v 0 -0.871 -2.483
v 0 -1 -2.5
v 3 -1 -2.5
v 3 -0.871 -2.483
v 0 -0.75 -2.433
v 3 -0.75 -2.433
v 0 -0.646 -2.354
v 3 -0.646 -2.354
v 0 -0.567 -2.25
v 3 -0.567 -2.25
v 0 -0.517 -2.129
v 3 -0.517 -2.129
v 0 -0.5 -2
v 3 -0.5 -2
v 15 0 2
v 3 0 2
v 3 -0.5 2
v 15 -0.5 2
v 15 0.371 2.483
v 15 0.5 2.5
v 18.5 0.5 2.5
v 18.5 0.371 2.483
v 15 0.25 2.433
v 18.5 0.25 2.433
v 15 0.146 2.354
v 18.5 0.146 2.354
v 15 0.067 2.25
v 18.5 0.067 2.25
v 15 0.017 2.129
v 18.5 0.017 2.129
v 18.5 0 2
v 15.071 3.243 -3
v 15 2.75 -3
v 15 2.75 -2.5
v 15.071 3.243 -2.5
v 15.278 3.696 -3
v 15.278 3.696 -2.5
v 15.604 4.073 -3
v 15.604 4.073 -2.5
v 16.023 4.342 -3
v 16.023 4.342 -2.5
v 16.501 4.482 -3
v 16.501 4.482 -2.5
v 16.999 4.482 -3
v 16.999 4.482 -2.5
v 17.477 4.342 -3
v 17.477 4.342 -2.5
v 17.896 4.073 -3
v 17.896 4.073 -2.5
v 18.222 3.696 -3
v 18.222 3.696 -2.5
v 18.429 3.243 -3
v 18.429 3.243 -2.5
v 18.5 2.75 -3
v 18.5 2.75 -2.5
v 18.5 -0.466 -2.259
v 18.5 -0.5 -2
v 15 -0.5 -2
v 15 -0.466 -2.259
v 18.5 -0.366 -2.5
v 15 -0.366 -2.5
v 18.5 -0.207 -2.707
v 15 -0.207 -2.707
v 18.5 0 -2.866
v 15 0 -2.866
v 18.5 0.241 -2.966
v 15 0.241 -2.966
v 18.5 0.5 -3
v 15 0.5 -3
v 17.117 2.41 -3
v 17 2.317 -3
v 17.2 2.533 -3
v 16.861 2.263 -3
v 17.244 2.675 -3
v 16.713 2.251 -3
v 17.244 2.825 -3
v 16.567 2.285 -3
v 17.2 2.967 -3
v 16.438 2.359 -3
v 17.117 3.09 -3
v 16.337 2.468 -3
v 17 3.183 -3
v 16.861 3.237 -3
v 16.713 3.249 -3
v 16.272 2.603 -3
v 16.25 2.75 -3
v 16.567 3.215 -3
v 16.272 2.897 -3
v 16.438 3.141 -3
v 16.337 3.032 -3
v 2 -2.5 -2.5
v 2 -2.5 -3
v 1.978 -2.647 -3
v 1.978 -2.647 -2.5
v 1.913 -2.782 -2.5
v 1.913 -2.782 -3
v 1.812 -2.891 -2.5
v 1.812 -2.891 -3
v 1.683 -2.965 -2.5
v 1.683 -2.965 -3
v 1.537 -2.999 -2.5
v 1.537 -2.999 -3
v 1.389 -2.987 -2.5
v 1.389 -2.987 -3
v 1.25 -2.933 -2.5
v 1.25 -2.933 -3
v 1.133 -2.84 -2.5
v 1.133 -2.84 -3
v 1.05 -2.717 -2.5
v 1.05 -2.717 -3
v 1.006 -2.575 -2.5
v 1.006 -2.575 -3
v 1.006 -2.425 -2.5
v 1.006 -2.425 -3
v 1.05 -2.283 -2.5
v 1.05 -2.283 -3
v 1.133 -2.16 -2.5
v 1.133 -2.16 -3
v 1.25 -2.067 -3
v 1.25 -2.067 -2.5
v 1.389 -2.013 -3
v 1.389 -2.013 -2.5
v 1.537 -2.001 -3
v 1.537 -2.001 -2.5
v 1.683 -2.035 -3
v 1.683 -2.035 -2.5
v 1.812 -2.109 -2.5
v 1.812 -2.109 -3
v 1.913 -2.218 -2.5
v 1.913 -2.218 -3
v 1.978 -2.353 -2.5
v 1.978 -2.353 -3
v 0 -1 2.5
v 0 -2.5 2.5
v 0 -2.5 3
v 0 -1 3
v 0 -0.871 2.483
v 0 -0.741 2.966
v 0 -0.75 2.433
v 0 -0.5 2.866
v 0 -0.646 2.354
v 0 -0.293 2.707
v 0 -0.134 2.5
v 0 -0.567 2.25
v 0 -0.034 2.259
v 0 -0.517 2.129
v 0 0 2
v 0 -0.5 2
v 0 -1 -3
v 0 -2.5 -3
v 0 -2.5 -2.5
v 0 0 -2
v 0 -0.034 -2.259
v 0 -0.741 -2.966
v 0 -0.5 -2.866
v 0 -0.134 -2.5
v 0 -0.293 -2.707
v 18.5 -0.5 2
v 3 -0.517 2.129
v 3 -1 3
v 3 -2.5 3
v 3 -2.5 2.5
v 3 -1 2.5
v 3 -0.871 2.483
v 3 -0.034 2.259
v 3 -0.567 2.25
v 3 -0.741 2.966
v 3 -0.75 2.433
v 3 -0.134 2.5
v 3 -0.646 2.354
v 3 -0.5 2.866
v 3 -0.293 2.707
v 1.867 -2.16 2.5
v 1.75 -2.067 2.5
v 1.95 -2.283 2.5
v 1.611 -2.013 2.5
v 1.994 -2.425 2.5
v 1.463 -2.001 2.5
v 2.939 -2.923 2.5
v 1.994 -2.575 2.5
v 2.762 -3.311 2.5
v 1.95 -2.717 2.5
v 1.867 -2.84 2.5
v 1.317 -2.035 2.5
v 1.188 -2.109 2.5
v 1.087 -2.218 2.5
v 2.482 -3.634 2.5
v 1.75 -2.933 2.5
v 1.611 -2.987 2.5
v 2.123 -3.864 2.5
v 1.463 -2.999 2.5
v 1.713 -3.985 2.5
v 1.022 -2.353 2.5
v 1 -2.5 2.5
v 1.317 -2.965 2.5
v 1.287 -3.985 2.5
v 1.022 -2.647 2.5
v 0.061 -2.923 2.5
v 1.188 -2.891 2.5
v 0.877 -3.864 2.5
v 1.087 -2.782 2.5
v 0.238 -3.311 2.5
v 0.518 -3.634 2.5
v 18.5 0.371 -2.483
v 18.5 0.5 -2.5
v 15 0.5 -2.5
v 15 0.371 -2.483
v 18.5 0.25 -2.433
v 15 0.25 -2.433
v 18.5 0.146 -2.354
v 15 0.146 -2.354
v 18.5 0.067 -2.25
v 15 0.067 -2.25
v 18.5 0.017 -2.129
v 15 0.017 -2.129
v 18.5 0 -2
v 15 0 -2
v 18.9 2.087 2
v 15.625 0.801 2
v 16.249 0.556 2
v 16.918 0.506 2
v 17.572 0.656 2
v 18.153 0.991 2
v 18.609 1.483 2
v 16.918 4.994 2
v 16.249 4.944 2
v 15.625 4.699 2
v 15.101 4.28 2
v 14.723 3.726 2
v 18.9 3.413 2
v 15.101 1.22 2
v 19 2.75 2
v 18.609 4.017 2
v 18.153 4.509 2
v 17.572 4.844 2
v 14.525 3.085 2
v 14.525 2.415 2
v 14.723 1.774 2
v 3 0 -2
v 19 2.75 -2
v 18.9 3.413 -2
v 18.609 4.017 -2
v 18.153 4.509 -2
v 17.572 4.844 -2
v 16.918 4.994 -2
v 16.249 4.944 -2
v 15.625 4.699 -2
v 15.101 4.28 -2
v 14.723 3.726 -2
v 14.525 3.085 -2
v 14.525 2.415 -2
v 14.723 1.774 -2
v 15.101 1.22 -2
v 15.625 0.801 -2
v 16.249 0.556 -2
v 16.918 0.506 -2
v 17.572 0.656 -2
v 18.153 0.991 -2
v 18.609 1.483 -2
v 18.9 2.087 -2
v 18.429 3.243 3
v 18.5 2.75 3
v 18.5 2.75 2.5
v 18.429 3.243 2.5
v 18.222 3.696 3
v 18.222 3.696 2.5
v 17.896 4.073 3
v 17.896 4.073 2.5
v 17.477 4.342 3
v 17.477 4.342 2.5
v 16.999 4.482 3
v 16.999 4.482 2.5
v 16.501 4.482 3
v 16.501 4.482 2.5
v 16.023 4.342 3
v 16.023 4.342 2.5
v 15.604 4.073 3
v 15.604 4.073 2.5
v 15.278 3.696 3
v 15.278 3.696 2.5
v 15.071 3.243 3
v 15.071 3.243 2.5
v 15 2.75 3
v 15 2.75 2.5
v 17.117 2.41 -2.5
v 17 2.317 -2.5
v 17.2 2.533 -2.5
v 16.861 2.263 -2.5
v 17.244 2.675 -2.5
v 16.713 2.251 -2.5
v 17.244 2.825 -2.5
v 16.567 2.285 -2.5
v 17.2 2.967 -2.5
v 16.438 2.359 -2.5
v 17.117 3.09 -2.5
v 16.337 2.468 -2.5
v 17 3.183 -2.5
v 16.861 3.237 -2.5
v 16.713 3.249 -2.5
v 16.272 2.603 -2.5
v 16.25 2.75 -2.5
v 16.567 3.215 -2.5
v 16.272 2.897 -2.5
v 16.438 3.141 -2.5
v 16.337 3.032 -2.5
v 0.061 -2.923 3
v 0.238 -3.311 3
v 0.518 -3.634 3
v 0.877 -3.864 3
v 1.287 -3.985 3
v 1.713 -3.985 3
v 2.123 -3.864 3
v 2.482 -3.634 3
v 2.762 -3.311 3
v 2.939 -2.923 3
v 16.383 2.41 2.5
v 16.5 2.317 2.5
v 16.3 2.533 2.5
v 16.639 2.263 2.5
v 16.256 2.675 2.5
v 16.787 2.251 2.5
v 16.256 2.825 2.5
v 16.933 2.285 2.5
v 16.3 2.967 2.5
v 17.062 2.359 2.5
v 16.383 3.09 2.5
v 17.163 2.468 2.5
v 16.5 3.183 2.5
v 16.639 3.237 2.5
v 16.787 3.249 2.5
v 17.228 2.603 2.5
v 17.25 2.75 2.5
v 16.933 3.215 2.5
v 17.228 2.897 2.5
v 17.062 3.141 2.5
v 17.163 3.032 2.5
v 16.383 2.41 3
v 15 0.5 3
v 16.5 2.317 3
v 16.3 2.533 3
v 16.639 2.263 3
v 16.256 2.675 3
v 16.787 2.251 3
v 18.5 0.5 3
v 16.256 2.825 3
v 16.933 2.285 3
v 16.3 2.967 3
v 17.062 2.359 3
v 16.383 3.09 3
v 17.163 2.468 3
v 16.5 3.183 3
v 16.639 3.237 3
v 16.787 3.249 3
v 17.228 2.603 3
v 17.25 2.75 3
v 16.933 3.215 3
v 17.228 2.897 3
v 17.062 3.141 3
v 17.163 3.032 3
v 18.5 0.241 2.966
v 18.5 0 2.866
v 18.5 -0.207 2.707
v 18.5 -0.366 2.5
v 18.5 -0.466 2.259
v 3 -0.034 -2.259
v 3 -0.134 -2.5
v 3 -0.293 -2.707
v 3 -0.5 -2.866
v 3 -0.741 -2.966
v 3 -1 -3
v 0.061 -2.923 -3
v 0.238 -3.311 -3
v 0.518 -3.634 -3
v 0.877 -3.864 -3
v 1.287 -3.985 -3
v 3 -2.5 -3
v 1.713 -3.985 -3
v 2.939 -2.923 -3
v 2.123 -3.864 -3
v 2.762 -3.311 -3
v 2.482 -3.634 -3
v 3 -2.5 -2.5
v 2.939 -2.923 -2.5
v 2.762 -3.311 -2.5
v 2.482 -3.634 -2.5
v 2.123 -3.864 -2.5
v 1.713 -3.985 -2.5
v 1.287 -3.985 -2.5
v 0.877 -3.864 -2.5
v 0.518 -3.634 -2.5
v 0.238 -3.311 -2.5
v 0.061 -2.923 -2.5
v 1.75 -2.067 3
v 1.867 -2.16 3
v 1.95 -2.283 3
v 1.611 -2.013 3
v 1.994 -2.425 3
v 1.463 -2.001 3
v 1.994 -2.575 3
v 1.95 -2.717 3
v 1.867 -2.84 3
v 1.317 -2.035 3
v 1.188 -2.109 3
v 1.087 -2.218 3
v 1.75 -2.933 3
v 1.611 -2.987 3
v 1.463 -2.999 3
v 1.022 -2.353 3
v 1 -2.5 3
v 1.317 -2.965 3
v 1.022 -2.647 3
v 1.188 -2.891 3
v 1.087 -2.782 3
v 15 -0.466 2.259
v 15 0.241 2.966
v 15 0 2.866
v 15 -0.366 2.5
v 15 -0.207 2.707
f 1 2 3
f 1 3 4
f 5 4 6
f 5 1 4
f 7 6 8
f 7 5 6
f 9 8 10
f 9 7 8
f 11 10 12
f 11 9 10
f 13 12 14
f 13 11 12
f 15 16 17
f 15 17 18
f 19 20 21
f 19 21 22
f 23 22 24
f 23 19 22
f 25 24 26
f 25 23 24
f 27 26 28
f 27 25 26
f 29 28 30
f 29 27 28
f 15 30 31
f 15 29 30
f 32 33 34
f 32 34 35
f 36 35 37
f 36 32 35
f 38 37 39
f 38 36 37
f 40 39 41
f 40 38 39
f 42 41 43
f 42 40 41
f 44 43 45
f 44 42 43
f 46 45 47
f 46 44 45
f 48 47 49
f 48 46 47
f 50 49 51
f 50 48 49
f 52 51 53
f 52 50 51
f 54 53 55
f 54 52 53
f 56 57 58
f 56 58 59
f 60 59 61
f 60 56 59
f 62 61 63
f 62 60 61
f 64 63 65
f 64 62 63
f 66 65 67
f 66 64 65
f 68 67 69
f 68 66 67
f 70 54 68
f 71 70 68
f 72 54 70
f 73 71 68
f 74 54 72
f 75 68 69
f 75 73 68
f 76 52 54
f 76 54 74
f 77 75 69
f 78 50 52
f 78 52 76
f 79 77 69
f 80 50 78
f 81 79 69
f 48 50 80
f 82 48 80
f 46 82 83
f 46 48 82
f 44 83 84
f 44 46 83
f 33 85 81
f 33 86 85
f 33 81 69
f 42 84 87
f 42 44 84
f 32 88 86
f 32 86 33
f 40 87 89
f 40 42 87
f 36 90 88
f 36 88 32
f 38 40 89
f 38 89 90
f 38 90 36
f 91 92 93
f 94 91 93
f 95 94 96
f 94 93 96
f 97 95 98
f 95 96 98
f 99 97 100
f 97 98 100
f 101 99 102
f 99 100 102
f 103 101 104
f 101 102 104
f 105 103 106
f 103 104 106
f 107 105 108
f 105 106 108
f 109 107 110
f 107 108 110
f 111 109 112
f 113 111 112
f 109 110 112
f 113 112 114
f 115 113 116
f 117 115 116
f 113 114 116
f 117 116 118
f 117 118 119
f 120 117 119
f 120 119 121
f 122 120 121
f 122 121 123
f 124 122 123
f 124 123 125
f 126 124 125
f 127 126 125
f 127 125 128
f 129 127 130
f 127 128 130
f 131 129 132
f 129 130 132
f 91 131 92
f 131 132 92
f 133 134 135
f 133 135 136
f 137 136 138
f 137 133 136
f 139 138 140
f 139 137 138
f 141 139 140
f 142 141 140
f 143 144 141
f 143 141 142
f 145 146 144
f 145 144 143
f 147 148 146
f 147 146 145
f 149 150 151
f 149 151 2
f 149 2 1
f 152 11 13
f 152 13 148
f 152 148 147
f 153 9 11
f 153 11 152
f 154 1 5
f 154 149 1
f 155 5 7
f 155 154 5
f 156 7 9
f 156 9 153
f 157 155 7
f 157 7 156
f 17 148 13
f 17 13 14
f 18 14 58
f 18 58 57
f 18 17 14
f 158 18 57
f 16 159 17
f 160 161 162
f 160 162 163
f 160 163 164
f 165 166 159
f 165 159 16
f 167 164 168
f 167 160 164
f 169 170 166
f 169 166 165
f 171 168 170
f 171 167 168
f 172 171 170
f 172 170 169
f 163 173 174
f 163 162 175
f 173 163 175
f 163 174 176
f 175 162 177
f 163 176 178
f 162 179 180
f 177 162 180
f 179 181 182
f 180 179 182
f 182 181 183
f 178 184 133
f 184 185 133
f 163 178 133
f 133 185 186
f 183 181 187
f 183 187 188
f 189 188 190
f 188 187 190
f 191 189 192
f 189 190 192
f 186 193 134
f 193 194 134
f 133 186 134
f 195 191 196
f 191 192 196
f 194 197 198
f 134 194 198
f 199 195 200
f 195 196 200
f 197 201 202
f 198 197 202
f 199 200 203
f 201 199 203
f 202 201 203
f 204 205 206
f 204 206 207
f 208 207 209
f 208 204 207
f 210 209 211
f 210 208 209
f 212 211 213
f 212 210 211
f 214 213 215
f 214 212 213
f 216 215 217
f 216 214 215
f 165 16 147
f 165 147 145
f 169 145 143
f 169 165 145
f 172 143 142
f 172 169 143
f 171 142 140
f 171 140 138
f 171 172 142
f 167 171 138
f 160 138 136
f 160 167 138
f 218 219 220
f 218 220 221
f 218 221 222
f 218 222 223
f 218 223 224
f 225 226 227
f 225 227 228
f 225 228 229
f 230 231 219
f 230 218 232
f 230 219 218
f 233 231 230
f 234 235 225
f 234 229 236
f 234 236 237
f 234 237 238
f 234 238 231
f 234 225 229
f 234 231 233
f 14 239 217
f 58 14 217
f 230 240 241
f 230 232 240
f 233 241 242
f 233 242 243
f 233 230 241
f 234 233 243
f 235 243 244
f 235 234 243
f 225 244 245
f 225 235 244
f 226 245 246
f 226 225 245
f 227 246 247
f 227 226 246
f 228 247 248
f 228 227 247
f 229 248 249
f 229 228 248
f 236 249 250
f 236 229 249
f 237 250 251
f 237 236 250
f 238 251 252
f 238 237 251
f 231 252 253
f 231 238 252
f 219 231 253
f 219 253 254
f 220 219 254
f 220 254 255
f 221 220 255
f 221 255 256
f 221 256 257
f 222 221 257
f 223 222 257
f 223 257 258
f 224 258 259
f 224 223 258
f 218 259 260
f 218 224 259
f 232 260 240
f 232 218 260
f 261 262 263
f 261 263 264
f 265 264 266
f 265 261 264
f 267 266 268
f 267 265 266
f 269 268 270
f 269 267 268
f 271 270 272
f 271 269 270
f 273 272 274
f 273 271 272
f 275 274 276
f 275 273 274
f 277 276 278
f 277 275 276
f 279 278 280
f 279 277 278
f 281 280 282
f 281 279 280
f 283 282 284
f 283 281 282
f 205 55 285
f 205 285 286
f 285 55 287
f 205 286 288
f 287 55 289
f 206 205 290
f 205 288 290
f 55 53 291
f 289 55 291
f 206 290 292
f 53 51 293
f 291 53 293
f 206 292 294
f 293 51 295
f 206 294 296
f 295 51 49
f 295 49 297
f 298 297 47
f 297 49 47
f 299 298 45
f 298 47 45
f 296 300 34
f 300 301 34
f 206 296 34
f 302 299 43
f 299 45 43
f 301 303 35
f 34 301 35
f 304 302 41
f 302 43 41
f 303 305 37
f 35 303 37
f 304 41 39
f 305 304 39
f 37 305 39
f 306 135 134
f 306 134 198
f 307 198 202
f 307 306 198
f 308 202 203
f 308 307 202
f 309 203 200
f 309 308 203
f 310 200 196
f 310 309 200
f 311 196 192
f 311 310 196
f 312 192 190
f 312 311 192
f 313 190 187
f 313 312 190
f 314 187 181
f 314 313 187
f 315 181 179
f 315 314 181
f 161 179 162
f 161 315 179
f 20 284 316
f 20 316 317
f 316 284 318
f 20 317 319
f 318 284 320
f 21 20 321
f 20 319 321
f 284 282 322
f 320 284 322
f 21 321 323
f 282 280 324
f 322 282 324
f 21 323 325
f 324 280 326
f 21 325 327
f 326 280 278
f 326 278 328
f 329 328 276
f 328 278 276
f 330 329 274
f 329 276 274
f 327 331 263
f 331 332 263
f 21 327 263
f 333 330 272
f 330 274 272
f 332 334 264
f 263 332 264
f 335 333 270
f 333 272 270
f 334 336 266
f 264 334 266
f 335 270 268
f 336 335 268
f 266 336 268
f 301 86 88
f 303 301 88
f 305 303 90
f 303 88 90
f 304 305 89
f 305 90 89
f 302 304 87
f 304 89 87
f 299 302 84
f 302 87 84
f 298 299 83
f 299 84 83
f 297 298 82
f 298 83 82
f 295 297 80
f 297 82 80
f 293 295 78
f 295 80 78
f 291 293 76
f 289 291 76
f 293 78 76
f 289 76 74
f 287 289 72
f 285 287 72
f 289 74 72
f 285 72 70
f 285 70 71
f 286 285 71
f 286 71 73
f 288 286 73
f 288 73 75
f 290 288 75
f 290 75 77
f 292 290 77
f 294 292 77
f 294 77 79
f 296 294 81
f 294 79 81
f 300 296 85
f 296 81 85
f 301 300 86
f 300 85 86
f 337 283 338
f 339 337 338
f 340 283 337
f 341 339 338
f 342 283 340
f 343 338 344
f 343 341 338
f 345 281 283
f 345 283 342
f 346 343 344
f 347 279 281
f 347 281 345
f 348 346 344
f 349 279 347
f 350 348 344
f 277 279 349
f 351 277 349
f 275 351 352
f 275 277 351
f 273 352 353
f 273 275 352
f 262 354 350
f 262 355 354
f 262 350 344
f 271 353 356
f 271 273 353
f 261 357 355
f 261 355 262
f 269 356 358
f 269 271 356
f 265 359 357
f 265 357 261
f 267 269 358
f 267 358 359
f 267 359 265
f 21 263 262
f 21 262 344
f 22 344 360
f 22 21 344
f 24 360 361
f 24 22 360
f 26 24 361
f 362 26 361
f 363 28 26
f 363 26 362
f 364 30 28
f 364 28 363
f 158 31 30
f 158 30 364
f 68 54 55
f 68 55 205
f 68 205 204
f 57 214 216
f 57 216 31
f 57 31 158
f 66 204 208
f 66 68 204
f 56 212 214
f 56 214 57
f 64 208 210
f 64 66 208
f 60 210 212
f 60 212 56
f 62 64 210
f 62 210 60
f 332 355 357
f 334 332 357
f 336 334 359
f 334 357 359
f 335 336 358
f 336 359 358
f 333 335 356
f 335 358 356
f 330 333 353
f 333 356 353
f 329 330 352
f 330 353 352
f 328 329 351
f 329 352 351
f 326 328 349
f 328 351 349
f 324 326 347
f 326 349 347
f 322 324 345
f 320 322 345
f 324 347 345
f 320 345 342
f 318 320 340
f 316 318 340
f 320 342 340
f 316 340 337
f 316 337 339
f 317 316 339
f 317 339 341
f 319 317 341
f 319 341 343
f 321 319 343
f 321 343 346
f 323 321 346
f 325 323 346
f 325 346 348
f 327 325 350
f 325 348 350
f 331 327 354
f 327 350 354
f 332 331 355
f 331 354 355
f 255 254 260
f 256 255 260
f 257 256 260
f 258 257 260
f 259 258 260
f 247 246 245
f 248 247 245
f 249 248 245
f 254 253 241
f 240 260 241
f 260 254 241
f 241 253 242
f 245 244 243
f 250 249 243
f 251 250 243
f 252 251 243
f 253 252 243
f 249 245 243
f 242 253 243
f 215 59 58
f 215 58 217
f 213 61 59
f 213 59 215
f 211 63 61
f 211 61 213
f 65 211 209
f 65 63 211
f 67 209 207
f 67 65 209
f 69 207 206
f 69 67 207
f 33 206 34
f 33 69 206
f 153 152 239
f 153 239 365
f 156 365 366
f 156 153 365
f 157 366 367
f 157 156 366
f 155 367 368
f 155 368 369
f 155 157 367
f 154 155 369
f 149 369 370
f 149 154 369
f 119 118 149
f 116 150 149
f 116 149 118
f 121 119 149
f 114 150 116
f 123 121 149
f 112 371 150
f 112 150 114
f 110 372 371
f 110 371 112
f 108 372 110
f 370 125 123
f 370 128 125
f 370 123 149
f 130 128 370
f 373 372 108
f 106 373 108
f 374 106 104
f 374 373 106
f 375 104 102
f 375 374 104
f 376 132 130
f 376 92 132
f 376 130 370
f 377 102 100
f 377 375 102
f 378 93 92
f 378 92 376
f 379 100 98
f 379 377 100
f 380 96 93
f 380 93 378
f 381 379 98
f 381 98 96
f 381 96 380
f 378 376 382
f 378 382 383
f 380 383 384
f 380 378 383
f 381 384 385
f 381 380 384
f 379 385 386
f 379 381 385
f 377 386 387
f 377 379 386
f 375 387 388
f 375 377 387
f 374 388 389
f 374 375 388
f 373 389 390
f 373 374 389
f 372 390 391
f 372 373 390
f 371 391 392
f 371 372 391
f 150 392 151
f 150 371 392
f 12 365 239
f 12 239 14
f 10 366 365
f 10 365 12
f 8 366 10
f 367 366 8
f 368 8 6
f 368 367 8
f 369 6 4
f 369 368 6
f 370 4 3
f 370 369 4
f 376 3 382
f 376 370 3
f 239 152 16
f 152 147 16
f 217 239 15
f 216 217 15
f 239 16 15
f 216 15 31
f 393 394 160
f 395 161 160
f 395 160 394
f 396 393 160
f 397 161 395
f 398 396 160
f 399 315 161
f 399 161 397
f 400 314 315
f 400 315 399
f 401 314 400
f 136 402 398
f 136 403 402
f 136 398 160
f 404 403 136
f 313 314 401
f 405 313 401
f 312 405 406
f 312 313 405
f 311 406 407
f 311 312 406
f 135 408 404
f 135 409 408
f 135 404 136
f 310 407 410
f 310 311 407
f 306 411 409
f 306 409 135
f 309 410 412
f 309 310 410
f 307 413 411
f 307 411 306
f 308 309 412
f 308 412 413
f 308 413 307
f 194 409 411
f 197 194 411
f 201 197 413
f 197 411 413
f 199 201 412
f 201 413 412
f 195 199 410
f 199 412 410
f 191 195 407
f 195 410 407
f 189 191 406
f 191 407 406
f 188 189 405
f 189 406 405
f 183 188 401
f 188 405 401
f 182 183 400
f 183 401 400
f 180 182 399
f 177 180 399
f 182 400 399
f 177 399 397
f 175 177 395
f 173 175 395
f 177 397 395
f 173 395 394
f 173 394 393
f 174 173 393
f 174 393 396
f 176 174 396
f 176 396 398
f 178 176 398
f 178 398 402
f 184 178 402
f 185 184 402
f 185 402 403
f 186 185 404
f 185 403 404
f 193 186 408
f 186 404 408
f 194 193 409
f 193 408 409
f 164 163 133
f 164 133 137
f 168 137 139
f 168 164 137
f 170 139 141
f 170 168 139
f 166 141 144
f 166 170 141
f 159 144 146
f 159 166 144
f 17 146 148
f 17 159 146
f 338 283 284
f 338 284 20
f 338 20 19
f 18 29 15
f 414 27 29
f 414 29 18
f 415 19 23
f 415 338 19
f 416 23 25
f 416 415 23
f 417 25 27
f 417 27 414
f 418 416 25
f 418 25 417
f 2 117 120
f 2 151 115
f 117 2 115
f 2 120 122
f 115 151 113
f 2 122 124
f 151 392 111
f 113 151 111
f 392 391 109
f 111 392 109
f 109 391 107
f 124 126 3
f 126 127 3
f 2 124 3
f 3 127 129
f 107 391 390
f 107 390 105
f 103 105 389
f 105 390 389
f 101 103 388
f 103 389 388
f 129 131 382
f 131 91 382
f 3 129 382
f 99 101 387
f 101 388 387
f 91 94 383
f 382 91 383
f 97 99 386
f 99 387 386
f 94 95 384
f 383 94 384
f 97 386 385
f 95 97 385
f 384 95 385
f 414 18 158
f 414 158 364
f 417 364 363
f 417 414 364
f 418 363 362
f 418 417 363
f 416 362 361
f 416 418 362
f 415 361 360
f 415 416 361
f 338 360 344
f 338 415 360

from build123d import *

# Parameters (mm, degrees)
ESQUISSE1_W                        = 18.5
ESQUISSE1_H                        = 0.5
T_LE_DE_BASE_PLI_E1_DEPTH          = 2
T_LE_PLI_E_SUR_AR_TE1_DEPTH        = 3.5
T_LE_START                         = 0.5
T_LE_PLI_E_SUR_AR_TE1_PROFILE_R    = 0.5
T_LE_PLI_E_SUR_AR_TE1_FLAT_DEPTH   = 0.5
T_LE_PLI_E_SUR_AR_TE1_BEND_DEPTH   = 3.5
T_LE_PLI_E_SUR_AR_TE1_PROFILE_2_R  = 0.5
T_LE_PLI_E_SUR_AR_TE1_FLAT_2_DEPTH = 0.5
ESQUISSE12_R                       = 2.25
BOSS_EXTRU_1_DEPTH                 = 2
T_LE_PLI_E_SUR_AR_TE2_DEPTH        = 3
T_LE_PLI_E_SUR_AR_TE2_PROFILE_R    = 0.5
T_LE_PLI_E_SUR_AR_TE2_FLAT_DEPTH   = 0.5
T_LE_PLI_E_SUR_AR_TE2_BEND_DEPTH   = 3
T_LE_PLI_E_SUR_AR_TE2_PROFILE_2_R  = 0.5
T_LE_PLI_E_SUR_AR_TE2_FLAT_2_DEPTH = 0.5


# Sheet-metal steps are written as plain solids
with BuildPart() as part:
    # Esquisse1 → Tôle de base pliée1 (new, symmetric)
    with BuildSketch(Plane.XY):
        with Locations((9.25, -0.25)):
            Rectangle(ESQUISSE1_W, ESQUISSE1_H)
    extrude(amount=T_LE_DE_BASE_PLI_E1_DEPTH, both=True)

    # Tôle pliée sur arête1 bend section (across the edge) → Tôle pliée sur arête1 (add)
    with BuildSketch(Plane(origin=(15, 0, 2.5), x_dir=(0, 0, -1), z_dir=(1, 0, 0))):
        with BuildLine():
            Line((-0.5, 0.5), (0, 0.5))
            ThreePointArc((0, 0.5), (0.146446609, 0.146446609), (0.5, 0))
            Line((0.5, 0), (0.5, -0.5))
            ThreePointArc((0.5, -0.5), (-0.207106781, -0.207106781), (-0.5, 0.5))
        make_face()
    extrude(amount=T_LE_PLI_E_SUR_AR_TE1_DEPTH)

    # Tôle pliée sur arête1 profile (on flange) → Tôle pliée sur arête1 flat (add)
    with BuildSketch(Plane.XY.offset(2.5).offset(T_LE_START)):
        with BuildLine():
            Line((15, 0.5), (18.5, 0.5))
            Line((18.5, 0.5), (18.5, 2.75))
            ThreePointArc((18.5, 2.75), (16.75, 4.5), (15, 2.75))
            Line((15, 2.75), (15, 0.5))
        make_face()
        with Locations((16.75, 2.75)):
            Circle(T_LE_PLI_E_SUR_AR_TE1_PROFILE_R, mode=Mode.SUBTRACT)
    extrude(amount=-T_LE_PLI_E_SUR_AR_TE1_FLAT_DEPTH)

    # Tôle pliée sur arête1 bend section 2 (across the edge) → Tôle pliée sur arête1 bend (add)
    with BuildSketch(Plane(origin=(18.5, 0, -2.5), x_dir=(0, 0, 1), z_dir=(-1, 0, 0))):
        with BuildLine():
            Line((-0.5, 0.5), (0, 0.5))
            ThreePointArc((0, 0.5), (0.146446609, 0.146446609), (0.5, 0))
            Line((0.5, 0), (0.5, -0.5))
            ThreePointArc((0.5, -0.5), (-0.207106781, -0.207106781), (-0.5, 0.5))
        make_face()
    extrude(amount=T_LE_PLI_E_SUR_AR_TE1_BEND_DEPTH)

    # Tôle pliée sur arête1 profile 2 (on flange) → Tôle pliée sur arête1 flat 2 (add)
    with BuildSketch(Plane(origin=(0, 0, -2.5), x_dir=(-1, 0, 0), z_dir=(0, 0, -1)).offset(T_LE_START)):
        with BuildLine():
            Line((-18.5, 2.75), (-18.5, 0.5))
            Line((-18.5, 0.5), (-15, 0.5))
            Line((-15, 0.5), (-15, 2.75))
            ThreePointArc((-15, 2.75), (-16.75, 4.5), (-18.5, 2.75))
        make_face()
        with Locations((-16.75, 2.75)):
            Circle(T_LE_PLI_E_SUR_AR_TE1_PROFILE_2_R, mode=Mode.SUBTRACT)
    extrude(amount=-T_LE_PLI_E_SUR_AR_TE1_FLAT_2_DEPTH)

    # Tôle pliée sur arête2 bend section (across the edge) → Tôle pliée sur arête2 (add)
    with BuildSketch(Plane(origin=(3, -0.5, 2.5), x_dir=(0, 0, -1), z_dir=(-1, 0, 0))):
        with BuildLine():
            Line((-0.5, 0.5), (0, 0.5))
            ThreePointArc((0, 0.5), (0.146446609, 0.146446609), (0.5, 0))
            Line((0.5, 0), (0.5, -0.5))
            ThreePointArc((0.5, -0.5), (-0.207106781, -0.207106781), (-0.5, 0.5))
        make_face()
    extrude(amount=T_LE_PLI_E_SUR_AR_TE2_DEPTH)

    # Tôle pliée sur arête2 profile (on flange) → Tôle pliée sur arête2 flat (add)
    with BuildSketch(Plane(origin=(0, -0.5, 2.5), x_dir=(-1, 0, 0), z_dir=(0, 0, 1)).offset(T_LE_START)):
        with BuildLine():
            ThreePointArc((0, 2), (-1.5, 3.5), (-3, 2))
            Line((-3, 2), (-3, 0.5))
            Line((-3, 0.5), (0, 0.5))
            Line((0, 0.5), (0, 2))
        make_face()
        with Locations((-1.5, 2)):
            Circle(T_LE_PLI_E_SUR_AR_TE2_PROFILE_R, mode=Mode.SUBTRACT)
    extrude(amount=-T_LE_PLI_E_SUR_AR_TE2_FLAT_DEPTH)

    # Tôle pliée sur arête2 bend section 2 (across the edge) → Tôle pliée sur arête2 bend (add)
    with BuildSketch(Plane(origin=(0, -0.5, -2.5), x_dir=(0, 0, 1), z_dir=(1, 0, 0))):
        with BuildLine():
            Line((-0.5, 0.5), (0, 0.5))
            ThreePointArc((0, 0.5), (0.146446609, 0.146446609), (0.5, 0))
            Line((0.5, 0), (0.5, -0.5))
            ThreePointArc((0.5, -0.5), (-0.207106781, -0.207106781), (-0.5, 0.5))
        make_face()
    extrude(amount=T_LE_PLI_E_SUR_AR_TE2_BEND_DEPTH)

    # Tôle pliée sur arête2 profile 2 (on flange) → Tôle pliée sur arête2 flat 2 (add)
    with BuildSketch(Plane(origin=(0, -0.5, -2.5), x_dir=(1, 0, 0), z_dir=(0, 0, -1)).offset(T_LE_START)):
        with BuildLine():
            ThreePointArc((3, 2), (1.5, 3.5), (0, 2))
            Line((0, 2), (0, 0.5))
            Line((0, 0.5), (3, 0.5))
            Line((3, 0.5), (3, 2))
        make_face()
        with Locations((1.5, 2)):
            Circle(T_LE_PLI_E_SUR_AR_TE2_PROFILE_2_R, mode=Mode.SUBTRACT)
    extrude(amount=-T_LE_PLI_E_SUR_AR_TE2_FLAT_2_DEPTH)


with BuildPart() as body_2:
    # Esquisse12 → Boss.-Extru.1 (new, symmetric)
    with BuildSketch(Plane.XY):
        with Locations((16.75, 2.75)):
            Circle(ESQUISSE12_R)
    extrude(amount=BOSS_EXTRU_1_DEPTH, both=True)


solid = Compound([part.part, body_2.part])
